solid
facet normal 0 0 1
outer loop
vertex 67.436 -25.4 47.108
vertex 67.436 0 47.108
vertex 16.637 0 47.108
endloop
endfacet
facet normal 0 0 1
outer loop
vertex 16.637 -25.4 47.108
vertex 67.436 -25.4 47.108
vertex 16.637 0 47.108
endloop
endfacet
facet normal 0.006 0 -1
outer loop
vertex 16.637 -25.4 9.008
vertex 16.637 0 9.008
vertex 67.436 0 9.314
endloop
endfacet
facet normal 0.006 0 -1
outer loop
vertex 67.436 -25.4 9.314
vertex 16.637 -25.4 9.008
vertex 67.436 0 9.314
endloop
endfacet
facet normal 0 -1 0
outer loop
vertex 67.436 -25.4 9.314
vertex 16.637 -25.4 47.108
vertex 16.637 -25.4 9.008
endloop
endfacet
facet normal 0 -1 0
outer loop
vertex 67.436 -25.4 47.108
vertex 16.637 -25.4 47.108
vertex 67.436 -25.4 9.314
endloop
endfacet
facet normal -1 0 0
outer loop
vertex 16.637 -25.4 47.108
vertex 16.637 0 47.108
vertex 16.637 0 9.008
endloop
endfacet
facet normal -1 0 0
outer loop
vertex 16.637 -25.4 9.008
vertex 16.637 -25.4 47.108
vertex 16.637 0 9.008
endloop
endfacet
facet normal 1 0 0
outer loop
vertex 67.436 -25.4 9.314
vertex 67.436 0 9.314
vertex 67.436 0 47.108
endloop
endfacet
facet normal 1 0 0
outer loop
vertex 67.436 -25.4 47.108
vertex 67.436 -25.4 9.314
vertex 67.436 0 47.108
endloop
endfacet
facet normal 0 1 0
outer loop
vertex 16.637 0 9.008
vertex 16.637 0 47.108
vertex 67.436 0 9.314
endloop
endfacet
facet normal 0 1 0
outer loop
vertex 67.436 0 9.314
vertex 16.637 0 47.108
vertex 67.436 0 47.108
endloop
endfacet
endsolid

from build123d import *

# Parameters (mm, degrees)
F1_DEPTH = 25.4
F3_DEPTH = 31.75
F4_DEPTH = 25.4


with BuildPart() as f1:
    # F0 (on Front) → F1 (new body)
    with BuildSketch(Plane.XZ):
        Polygon((16.637316, 47.108235), (16.637316, 9.008235), (67.436395, 9.314255), (67.436395, 47.108235), align=None)
    extrude(amount=F1_DEPTH)

    # F2 (on face) → F3 (cut)
    with BuildSketch(Plane.XZ.offset(25.4)):
        Polygon((67.436395, 47.108235), (45.571412, 47.108235), (67.436395, 24.086831), align=None)
    extrude(amount=-F3_DEPTH, mode=Mode.SUBTRACT)

    # F0 (on Front) → F4 (join)
    with BuildSketch(Plane.XZ):
        Polygon((16.637316, 47.108235), (16.637316, 9.008235), (67.436395, 9.314255), (67.436395, 47.108235), align=None)
    extrude(amount=F4_DEPTH)


solid = f1.part
